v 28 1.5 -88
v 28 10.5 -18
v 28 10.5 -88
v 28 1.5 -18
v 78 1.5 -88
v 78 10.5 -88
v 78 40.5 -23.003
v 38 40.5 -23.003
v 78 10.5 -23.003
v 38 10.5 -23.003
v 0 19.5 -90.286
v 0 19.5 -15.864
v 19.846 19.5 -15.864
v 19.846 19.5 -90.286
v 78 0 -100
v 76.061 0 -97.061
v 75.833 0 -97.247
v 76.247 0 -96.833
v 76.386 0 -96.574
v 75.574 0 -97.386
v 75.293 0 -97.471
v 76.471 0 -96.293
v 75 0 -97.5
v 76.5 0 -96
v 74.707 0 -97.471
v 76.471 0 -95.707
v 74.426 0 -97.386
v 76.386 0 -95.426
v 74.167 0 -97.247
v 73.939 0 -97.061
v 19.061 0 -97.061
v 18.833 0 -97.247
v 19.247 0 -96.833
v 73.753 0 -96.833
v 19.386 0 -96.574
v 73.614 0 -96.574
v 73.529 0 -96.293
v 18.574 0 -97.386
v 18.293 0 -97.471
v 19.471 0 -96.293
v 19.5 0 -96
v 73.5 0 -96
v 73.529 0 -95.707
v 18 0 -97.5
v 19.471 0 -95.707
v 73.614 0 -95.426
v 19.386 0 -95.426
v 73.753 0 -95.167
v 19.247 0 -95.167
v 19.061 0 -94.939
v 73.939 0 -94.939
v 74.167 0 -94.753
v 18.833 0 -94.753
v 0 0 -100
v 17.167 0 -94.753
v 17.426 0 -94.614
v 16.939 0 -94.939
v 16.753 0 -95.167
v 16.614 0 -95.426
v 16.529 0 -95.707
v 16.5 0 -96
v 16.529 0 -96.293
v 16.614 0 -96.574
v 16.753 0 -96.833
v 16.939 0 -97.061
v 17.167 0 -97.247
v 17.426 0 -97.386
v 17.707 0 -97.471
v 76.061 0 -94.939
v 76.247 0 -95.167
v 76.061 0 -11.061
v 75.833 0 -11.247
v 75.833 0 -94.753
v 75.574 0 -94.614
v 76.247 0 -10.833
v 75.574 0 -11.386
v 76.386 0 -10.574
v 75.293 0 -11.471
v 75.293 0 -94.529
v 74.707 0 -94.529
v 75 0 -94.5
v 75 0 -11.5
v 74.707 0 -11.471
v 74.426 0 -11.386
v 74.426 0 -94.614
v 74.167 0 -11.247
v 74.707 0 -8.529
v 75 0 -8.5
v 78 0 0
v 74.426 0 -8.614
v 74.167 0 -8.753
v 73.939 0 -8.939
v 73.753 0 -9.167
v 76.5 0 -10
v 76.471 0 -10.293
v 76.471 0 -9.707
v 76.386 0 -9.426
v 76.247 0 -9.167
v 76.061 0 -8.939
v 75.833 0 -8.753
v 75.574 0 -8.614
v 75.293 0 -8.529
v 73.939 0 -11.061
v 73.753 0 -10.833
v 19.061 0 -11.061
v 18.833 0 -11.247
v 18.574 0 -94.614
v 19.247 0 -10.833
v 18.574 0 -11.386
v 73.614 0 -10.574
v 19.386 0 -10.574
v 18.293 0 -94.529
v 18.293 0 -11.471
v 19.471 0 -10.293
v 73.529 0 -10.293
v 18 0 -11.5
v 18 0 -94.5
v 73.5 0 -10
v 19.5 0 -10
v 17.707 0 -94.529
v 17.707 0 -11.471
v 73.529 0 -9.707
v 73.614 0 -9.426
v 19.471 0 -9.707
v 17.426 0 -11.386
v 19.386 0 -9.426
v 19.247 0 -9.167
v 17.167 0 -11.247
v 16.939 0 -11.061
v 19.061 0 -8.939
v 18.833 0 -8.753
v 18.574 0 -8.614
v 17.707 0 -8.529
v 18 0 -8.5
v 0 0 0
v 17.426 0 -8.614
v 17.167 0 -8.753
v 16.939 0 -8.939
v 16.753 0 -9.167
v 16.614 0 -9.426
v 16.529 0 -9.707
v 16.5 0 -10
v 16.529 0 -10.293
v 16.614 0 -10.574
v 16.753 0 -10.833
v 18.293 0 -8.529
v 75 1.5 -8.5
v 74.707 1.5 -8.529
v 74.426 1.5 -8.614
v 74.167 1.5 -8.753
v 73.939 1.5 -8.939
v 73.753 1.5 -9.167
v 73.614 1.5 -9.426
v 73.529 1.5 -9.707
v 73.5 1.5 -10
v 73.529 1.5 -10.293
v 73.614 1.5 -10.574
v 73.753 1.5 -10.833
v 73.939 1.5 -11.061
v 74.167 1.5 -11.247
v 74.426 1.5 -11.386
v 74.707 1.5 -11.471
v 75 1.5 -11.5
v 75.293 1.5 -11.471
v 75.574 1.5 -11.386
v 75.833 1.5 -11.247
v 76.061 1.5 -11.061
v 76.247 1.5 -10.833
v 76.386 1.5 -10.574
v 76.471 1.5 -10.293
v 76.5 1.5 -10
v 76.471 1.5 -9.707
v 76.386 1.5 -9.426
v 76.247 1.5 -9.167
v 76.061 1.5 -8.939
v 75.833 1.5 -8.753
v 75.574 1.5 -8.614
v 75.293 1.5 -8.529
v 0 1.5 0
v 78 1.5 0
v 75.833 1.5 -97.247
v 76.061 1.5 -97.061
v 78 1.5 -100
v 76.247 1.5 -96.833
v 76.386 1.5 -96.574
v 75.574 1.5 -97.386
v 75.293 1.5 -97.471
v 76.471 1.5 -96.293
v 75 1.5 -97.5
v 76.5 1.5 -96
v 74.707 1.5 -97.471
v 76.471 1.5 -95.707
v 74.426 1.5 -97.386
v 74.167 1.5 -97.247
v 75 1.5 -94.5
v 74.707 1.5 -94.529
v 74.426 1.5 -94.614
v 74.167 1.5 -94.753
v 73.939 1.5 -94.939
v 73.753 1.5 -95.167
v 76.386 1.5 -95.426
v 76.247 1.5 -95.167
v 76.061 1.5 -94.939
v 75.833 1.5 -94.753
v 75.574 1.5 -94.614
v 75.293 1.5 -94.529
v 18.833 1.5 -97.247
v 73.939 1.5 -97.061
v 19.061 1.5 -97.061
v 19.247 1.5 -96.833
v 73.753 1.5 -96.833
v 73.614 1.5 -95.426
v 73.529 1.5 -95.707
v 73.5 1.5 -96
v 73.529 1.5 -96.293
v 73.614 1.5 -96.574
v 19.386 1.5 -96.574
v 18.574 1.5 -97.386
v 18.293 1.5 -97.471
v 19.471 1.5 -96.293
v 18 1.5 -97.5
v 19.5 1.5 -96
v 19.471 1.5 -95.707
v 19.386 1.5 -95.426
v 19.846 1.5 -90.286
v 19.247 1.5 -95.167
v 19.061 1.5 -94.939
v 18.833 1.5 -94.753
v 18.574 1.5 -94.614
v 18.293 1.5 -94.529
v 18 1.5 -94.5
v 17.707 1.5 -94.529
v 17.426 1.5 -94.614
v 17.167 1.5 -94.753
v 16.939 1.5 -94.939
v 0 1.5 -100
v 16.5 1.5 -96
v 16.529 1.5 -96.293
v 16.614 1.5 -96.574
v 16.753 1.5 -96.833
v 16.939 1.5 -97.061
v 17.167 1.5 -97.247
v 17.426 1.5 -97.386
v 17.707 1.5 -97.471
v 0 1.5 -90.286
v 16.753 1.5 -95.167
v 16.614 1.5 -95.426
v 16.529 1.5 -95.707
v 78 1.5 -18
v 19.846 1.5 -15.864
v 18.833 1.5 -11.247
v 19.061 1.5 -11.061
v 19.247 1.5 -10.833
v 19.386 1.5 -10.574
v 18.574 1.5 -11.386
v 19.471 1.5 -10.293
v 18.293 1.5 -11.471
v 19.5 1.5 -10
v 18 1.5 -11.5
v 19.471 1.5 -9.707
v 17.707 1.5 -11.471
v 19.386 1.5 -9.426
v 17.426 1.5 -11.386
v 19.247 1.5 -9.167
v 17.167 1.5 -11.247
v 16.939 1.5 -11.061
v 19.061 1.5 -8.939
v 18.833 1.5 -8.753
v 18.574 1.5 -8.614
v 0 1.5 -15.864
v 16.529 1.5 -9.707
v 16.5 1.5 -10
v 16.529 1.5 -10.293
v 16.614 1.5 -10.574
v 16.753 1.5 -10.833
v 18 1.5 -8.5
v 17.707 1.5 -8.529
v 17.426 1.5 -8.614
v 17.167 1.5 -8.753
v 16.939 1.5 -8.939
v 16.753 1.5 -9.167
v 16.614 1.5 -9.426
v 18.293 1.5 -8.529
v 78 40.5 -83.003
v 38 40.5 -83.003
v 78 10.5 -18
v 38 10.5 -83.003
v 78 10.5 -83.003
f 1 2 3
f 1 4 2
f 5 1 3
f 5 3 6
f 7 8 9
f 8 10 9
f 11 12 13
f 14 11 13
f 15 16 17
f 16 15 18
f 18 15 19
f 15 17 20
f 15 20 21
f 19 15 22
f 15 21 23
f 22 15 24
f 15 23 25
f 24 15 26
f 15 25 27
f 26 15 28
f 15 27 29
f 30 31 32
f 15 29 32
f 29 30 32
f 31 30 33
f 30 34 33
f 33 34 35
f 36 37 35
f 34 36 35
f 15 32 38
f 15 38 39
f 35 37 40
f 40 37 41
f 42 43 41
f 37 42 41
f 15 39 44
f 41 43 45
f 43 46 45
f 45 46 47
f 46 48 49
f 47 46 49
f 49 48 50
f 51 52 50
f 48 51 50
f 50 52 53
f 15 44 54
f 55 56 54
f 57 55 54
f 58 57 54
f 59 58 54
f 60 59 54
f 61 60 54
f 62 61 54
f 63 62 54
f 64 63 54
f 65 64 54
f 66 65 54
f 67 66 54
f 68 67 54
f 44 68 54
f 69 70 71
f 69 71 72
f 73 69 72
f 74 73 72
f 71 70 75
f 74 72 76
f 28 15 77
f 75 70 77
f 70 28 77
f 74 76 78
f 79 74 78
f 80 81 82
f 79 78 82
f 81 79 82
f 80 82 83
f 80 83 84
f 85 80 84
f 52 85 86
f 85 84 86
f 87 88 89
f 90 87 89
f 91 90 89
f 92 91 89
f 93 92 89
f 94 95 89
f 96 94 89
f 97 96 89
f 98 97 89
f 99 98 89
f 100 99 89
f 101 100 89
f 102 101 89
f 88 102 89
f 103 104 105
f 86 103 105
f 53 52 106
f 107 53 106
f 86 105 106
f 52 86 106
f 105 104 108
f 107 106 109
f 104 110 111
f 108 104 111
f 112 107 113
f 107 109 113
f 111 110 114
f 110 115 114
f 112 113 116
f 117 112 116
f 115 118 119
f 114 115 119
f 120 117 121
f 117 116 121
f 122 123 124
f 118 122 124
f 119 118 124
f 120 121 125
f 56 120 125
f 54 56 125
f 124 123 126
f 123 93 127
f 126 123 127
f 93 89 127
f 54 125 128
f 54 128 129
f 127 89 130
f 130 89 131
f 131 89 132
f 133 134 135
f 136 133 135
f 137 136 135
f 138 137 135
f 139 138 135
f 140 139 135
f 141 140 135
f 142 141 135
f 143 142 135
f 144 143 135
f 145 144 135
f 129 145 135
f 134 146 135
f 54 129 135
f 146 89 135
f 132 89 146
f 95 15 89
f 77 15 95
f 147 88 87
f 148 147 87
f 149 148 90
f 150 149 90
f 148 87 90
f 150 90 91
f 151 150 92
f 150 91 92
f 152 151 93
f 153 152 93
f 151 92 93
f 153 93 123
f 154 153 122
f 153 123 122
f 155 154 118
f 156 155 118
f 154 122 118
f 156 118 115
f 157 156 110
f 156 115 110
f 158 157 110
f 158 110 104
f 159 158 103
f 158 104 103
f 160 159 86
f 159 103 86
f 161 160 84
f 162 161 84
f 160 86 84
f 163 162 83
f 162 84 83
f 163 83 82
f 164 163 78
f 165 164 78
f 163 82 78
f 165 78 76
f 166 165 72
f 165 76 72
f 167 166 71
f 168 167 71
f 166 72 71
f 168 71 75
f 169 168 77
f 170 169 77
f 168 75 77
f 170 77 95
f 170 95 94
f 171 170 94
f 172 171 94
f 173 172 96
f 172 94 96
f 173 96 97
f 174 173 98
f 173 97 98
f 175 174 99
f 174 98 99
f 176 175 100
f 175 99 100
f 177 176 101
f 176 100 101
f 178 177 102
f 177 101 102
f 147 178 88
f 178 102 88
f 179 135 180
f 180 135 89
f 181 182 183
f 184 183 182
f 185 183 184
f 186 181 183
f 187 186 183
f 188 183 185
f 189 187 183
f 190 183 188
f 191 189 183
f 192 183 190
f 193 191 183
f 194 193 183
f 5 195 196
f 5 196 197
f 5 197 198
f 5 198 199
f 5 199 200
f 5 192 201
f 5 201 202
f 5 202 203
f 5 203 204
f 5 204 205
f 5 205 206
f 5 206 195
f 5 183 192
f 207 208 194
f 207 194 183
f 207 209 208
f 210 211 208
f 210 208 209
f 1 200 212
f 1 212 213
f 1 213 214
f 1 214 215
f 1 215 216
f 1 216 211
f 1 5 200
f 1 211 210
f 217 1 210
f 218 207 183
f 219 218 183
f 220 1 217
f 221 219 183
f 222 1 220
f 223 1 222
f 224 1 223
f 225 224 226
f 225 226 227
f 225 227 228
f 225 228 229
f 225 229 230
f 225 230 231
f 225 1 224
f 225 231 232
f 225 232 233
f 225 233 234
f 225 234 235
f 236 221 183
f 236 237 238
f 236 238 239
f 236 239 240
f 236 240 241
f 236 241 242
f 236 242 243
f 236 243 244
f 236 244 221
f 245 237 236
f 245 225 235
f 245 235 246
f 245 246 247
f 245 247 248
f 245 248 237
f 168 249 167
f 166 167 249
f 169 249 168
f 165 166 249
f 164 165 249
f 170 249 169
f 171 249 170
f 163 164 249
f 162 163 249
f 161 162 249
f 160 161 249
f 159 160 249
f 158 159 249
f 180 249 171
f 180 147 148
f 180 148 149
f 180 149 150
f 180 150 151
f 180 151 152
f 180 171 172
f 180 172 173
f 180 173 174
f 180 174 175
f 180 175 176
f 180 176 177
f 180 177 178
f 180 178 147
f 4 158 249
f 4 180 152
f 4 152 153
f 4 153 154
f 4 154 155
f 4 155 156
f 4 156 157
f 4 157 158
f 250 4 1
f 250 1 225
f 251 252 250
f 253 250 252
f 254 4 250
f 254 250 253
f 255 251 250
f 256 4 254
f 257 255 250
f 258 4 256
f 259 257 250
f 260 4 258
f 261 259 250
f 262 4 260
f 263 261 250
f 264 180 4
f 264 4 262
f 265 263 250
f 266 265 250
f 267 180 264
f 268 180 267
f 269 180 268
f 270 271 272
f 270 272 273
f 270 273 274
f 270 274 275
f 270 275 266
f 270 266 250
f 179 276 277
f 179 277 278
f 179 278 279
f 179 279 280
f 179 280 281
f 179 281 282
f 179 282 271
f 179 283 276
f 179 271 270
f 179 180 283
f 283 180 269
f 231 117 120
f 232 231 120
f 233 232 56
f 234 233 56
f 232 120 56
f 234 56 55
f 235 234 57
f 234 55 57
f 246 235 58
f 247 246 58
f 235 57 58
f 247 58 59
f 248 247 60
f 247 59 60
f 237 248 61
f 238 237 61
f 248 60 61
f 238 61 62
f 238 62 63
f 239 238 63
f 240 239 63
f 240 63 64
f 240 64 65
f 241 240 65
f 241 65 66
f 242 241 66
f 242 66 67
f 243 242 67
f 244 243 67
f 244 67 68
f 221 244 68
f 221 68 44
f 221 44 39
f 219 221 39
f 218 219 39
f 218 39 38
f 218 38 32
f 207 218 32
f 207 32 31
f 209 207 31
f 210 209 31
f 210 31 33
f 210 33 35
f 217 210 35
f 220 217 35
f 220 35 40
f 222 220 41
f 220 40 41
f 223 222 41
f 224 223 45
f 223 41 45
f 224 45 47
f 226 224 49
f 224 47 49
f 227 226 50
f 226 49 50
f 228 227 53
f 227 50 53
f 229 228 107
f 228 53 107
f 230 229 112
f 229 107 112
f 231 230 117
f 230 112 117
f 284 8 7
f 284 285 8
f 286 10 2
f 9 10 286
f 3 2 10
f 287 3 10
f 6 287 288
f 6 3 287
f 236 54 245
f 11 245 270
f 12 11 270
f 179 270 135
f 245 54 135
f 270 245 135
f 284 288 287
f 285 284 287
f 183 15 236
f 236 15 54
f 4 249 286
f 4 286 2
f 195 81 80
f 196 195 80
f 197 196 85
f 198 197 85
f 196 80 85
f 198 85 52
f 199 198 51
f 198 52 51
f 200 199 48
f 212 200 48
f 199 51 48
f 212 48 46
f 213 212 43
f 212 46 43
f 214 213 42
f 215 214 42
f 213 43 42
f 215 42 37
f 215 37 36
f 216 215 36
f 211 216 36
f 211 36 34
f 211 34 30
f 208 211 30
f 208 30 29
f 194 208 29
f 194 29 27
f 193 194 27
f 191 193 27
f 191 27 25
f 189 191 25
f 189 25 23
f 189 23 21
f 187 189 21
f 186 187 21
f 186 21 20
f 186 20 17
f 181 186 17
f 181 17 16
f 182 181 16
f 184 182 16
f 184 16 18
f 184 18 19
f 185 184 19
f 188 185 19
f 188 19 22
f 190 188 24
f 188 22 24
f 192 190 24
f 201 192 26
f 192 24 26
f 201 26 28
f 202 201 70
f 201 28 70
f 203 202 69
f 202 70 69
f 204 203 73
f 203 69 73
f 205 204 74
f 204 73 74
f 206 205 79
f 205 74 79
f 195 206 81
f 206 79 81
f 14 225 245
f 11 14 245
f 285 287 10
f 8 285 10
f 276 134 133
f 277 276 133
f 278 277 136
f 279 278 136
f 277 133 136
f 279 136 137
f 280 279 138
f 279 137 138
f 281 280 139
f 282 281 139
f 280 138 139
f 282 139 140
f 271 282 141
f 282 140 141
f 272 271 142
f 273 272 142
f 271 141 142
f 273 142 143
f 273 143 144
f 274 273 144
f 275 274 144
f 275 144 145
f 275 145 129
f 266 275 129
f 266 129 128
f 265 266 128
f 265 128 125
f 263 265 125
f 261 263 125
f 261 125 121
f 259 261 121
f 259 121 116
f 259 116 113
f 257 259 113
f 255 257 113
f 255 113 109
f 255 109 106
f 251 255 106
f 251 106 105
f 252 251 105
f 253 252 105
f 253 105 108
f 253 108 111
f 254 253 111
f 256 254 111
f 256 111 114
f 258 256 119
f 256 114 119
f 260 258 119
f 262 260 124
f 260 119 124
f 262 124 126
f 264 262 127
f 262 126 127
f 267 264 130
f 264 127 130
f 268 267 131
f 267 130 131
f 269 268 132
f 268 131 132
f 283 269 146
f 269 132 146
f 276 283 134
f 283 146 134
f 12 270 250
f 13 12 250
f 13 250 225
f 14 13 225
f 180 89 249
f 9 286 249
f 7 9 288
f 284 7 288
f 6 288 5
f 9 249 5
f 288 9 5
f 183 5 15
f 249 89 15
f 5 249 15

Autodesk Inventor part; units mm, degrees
ref_plane "YZ Plane" through (0, 0, 0) normal (1, 0, 0) x (0, 1, 0)
ref_plane "XY Plane" through (0, 0, 0) normal (0, 0, 1) x (1, 0, 0)
sketch "Skizze1" plane through (0, 0, 0) normal (0, 1, 0) x (-1, 0, 0)
  line L0 (0, 0) -> (-78, 0)
  line L1 (-78, 0) -> (-78, -100)
  line L2 (-78, -100) -> (0, -100)
  line L3 (0, -100) -> (0, 0)
  dimension "d0" = 78
  dimension "d1" = 100
extrude "Extrusion1" add sketch "Skizze1" along normal blind 1.5
sketch "Skizze2" plane through (0, 1.5, 0) normal (0, 1, 0) x (1, 0, 0)
  line L0 (78, 100) -> (0, 100) projected
  line L1 (78, 0) -> (78, 100) projected
  line L2 (0, 0) -> (78, 0) projected
  line L3 (0, 100) -> (0, 0) projected
  point P0 (75, 96)
  point P1 (75, 10)
  point P2 (18, 10)
  point P3 (18, 96)
  dimension "d4" = 4
  dimension "d5" = 3
  dimension "d6" = 10
  dimension "d7" = 3
  dimension "d8" = 18
  dimension "d9" = 10
  dimension "d10" = 4
  dimension "d11" = 18
hole "Bohrung1" at (75, 1.5, -96) at (75, 1.5, -10) at (18, 1.5, -10) at (18, 1.5, -96) direction (0, -1, 0) diameter 3 end through all
sketch "Skizze3" plane through (0, 1.5, 0) normal (0, 1, 0) x (1, 0, 0)
  line L0 (0, 100) -> (0, 0) projected
  line L1 (0, 15.8637) -> (19.8459, 15.8637)
  line L2 (19.8459, 15.8637) -> (19.8459, 90.2858)
  line L3 (19.8459, 90.2858) -> (0, 90.2858)
  line L4 (0, 90.2858) -> (0, 15.8637)
  dimension "d19" = 15.8637
  dimension "d20" = 74.4222
  dimension "d21" = 19.8459
extrude "Extrusion2" add sketch "Skizze3" along normal blind 18
sketch "Skizze4" plane through (0, 1.5, 0) normal (0, 1, 0) x (1, 0, 0)
  line L0 (78, 0) -> (78, 100) projected
  line L1 (78, 18) -> (28, 18)
  line L2 (28, 18) -> (28, 88)
  line L3 (28, 88) -> (78, 88)
  line L4 (78, 88) -> (78, 18)
  line L5 (0, 0) -> (78, 0) projected
  dimension "d24" = 18
  dimension "d25" = 50
  dimension "d26" = 70
extrude "Extrusion3" add sketch "Skizze4" along normal blind 9
sketch "Skizze5" plane through (0, 10.5, 0) normal (0, 1, 0) x (1, 0, 0)
  line L0 (38, 23.0032) -> (78, 23.0032)
  line L1 (78, 23.0032) -> (78, 83.0032)
  line L2 (78, 83.0032) -> (38, 83.0032)
  line L3 (38, 83.0032) -> (38, 23.0032)
  line L4 (78, 18) -> (78, 88) projected
  line L5 (28, 18) -> (78, 18) projected
  point P0 (0, 0)
  dimension "d29" = 40
  dimension "d30" = 60
  dimension "d31" = 5.0032
extrude "Extrusion4" add sketch "Skizze5" along normal blind 30
properties part number "jetson"
